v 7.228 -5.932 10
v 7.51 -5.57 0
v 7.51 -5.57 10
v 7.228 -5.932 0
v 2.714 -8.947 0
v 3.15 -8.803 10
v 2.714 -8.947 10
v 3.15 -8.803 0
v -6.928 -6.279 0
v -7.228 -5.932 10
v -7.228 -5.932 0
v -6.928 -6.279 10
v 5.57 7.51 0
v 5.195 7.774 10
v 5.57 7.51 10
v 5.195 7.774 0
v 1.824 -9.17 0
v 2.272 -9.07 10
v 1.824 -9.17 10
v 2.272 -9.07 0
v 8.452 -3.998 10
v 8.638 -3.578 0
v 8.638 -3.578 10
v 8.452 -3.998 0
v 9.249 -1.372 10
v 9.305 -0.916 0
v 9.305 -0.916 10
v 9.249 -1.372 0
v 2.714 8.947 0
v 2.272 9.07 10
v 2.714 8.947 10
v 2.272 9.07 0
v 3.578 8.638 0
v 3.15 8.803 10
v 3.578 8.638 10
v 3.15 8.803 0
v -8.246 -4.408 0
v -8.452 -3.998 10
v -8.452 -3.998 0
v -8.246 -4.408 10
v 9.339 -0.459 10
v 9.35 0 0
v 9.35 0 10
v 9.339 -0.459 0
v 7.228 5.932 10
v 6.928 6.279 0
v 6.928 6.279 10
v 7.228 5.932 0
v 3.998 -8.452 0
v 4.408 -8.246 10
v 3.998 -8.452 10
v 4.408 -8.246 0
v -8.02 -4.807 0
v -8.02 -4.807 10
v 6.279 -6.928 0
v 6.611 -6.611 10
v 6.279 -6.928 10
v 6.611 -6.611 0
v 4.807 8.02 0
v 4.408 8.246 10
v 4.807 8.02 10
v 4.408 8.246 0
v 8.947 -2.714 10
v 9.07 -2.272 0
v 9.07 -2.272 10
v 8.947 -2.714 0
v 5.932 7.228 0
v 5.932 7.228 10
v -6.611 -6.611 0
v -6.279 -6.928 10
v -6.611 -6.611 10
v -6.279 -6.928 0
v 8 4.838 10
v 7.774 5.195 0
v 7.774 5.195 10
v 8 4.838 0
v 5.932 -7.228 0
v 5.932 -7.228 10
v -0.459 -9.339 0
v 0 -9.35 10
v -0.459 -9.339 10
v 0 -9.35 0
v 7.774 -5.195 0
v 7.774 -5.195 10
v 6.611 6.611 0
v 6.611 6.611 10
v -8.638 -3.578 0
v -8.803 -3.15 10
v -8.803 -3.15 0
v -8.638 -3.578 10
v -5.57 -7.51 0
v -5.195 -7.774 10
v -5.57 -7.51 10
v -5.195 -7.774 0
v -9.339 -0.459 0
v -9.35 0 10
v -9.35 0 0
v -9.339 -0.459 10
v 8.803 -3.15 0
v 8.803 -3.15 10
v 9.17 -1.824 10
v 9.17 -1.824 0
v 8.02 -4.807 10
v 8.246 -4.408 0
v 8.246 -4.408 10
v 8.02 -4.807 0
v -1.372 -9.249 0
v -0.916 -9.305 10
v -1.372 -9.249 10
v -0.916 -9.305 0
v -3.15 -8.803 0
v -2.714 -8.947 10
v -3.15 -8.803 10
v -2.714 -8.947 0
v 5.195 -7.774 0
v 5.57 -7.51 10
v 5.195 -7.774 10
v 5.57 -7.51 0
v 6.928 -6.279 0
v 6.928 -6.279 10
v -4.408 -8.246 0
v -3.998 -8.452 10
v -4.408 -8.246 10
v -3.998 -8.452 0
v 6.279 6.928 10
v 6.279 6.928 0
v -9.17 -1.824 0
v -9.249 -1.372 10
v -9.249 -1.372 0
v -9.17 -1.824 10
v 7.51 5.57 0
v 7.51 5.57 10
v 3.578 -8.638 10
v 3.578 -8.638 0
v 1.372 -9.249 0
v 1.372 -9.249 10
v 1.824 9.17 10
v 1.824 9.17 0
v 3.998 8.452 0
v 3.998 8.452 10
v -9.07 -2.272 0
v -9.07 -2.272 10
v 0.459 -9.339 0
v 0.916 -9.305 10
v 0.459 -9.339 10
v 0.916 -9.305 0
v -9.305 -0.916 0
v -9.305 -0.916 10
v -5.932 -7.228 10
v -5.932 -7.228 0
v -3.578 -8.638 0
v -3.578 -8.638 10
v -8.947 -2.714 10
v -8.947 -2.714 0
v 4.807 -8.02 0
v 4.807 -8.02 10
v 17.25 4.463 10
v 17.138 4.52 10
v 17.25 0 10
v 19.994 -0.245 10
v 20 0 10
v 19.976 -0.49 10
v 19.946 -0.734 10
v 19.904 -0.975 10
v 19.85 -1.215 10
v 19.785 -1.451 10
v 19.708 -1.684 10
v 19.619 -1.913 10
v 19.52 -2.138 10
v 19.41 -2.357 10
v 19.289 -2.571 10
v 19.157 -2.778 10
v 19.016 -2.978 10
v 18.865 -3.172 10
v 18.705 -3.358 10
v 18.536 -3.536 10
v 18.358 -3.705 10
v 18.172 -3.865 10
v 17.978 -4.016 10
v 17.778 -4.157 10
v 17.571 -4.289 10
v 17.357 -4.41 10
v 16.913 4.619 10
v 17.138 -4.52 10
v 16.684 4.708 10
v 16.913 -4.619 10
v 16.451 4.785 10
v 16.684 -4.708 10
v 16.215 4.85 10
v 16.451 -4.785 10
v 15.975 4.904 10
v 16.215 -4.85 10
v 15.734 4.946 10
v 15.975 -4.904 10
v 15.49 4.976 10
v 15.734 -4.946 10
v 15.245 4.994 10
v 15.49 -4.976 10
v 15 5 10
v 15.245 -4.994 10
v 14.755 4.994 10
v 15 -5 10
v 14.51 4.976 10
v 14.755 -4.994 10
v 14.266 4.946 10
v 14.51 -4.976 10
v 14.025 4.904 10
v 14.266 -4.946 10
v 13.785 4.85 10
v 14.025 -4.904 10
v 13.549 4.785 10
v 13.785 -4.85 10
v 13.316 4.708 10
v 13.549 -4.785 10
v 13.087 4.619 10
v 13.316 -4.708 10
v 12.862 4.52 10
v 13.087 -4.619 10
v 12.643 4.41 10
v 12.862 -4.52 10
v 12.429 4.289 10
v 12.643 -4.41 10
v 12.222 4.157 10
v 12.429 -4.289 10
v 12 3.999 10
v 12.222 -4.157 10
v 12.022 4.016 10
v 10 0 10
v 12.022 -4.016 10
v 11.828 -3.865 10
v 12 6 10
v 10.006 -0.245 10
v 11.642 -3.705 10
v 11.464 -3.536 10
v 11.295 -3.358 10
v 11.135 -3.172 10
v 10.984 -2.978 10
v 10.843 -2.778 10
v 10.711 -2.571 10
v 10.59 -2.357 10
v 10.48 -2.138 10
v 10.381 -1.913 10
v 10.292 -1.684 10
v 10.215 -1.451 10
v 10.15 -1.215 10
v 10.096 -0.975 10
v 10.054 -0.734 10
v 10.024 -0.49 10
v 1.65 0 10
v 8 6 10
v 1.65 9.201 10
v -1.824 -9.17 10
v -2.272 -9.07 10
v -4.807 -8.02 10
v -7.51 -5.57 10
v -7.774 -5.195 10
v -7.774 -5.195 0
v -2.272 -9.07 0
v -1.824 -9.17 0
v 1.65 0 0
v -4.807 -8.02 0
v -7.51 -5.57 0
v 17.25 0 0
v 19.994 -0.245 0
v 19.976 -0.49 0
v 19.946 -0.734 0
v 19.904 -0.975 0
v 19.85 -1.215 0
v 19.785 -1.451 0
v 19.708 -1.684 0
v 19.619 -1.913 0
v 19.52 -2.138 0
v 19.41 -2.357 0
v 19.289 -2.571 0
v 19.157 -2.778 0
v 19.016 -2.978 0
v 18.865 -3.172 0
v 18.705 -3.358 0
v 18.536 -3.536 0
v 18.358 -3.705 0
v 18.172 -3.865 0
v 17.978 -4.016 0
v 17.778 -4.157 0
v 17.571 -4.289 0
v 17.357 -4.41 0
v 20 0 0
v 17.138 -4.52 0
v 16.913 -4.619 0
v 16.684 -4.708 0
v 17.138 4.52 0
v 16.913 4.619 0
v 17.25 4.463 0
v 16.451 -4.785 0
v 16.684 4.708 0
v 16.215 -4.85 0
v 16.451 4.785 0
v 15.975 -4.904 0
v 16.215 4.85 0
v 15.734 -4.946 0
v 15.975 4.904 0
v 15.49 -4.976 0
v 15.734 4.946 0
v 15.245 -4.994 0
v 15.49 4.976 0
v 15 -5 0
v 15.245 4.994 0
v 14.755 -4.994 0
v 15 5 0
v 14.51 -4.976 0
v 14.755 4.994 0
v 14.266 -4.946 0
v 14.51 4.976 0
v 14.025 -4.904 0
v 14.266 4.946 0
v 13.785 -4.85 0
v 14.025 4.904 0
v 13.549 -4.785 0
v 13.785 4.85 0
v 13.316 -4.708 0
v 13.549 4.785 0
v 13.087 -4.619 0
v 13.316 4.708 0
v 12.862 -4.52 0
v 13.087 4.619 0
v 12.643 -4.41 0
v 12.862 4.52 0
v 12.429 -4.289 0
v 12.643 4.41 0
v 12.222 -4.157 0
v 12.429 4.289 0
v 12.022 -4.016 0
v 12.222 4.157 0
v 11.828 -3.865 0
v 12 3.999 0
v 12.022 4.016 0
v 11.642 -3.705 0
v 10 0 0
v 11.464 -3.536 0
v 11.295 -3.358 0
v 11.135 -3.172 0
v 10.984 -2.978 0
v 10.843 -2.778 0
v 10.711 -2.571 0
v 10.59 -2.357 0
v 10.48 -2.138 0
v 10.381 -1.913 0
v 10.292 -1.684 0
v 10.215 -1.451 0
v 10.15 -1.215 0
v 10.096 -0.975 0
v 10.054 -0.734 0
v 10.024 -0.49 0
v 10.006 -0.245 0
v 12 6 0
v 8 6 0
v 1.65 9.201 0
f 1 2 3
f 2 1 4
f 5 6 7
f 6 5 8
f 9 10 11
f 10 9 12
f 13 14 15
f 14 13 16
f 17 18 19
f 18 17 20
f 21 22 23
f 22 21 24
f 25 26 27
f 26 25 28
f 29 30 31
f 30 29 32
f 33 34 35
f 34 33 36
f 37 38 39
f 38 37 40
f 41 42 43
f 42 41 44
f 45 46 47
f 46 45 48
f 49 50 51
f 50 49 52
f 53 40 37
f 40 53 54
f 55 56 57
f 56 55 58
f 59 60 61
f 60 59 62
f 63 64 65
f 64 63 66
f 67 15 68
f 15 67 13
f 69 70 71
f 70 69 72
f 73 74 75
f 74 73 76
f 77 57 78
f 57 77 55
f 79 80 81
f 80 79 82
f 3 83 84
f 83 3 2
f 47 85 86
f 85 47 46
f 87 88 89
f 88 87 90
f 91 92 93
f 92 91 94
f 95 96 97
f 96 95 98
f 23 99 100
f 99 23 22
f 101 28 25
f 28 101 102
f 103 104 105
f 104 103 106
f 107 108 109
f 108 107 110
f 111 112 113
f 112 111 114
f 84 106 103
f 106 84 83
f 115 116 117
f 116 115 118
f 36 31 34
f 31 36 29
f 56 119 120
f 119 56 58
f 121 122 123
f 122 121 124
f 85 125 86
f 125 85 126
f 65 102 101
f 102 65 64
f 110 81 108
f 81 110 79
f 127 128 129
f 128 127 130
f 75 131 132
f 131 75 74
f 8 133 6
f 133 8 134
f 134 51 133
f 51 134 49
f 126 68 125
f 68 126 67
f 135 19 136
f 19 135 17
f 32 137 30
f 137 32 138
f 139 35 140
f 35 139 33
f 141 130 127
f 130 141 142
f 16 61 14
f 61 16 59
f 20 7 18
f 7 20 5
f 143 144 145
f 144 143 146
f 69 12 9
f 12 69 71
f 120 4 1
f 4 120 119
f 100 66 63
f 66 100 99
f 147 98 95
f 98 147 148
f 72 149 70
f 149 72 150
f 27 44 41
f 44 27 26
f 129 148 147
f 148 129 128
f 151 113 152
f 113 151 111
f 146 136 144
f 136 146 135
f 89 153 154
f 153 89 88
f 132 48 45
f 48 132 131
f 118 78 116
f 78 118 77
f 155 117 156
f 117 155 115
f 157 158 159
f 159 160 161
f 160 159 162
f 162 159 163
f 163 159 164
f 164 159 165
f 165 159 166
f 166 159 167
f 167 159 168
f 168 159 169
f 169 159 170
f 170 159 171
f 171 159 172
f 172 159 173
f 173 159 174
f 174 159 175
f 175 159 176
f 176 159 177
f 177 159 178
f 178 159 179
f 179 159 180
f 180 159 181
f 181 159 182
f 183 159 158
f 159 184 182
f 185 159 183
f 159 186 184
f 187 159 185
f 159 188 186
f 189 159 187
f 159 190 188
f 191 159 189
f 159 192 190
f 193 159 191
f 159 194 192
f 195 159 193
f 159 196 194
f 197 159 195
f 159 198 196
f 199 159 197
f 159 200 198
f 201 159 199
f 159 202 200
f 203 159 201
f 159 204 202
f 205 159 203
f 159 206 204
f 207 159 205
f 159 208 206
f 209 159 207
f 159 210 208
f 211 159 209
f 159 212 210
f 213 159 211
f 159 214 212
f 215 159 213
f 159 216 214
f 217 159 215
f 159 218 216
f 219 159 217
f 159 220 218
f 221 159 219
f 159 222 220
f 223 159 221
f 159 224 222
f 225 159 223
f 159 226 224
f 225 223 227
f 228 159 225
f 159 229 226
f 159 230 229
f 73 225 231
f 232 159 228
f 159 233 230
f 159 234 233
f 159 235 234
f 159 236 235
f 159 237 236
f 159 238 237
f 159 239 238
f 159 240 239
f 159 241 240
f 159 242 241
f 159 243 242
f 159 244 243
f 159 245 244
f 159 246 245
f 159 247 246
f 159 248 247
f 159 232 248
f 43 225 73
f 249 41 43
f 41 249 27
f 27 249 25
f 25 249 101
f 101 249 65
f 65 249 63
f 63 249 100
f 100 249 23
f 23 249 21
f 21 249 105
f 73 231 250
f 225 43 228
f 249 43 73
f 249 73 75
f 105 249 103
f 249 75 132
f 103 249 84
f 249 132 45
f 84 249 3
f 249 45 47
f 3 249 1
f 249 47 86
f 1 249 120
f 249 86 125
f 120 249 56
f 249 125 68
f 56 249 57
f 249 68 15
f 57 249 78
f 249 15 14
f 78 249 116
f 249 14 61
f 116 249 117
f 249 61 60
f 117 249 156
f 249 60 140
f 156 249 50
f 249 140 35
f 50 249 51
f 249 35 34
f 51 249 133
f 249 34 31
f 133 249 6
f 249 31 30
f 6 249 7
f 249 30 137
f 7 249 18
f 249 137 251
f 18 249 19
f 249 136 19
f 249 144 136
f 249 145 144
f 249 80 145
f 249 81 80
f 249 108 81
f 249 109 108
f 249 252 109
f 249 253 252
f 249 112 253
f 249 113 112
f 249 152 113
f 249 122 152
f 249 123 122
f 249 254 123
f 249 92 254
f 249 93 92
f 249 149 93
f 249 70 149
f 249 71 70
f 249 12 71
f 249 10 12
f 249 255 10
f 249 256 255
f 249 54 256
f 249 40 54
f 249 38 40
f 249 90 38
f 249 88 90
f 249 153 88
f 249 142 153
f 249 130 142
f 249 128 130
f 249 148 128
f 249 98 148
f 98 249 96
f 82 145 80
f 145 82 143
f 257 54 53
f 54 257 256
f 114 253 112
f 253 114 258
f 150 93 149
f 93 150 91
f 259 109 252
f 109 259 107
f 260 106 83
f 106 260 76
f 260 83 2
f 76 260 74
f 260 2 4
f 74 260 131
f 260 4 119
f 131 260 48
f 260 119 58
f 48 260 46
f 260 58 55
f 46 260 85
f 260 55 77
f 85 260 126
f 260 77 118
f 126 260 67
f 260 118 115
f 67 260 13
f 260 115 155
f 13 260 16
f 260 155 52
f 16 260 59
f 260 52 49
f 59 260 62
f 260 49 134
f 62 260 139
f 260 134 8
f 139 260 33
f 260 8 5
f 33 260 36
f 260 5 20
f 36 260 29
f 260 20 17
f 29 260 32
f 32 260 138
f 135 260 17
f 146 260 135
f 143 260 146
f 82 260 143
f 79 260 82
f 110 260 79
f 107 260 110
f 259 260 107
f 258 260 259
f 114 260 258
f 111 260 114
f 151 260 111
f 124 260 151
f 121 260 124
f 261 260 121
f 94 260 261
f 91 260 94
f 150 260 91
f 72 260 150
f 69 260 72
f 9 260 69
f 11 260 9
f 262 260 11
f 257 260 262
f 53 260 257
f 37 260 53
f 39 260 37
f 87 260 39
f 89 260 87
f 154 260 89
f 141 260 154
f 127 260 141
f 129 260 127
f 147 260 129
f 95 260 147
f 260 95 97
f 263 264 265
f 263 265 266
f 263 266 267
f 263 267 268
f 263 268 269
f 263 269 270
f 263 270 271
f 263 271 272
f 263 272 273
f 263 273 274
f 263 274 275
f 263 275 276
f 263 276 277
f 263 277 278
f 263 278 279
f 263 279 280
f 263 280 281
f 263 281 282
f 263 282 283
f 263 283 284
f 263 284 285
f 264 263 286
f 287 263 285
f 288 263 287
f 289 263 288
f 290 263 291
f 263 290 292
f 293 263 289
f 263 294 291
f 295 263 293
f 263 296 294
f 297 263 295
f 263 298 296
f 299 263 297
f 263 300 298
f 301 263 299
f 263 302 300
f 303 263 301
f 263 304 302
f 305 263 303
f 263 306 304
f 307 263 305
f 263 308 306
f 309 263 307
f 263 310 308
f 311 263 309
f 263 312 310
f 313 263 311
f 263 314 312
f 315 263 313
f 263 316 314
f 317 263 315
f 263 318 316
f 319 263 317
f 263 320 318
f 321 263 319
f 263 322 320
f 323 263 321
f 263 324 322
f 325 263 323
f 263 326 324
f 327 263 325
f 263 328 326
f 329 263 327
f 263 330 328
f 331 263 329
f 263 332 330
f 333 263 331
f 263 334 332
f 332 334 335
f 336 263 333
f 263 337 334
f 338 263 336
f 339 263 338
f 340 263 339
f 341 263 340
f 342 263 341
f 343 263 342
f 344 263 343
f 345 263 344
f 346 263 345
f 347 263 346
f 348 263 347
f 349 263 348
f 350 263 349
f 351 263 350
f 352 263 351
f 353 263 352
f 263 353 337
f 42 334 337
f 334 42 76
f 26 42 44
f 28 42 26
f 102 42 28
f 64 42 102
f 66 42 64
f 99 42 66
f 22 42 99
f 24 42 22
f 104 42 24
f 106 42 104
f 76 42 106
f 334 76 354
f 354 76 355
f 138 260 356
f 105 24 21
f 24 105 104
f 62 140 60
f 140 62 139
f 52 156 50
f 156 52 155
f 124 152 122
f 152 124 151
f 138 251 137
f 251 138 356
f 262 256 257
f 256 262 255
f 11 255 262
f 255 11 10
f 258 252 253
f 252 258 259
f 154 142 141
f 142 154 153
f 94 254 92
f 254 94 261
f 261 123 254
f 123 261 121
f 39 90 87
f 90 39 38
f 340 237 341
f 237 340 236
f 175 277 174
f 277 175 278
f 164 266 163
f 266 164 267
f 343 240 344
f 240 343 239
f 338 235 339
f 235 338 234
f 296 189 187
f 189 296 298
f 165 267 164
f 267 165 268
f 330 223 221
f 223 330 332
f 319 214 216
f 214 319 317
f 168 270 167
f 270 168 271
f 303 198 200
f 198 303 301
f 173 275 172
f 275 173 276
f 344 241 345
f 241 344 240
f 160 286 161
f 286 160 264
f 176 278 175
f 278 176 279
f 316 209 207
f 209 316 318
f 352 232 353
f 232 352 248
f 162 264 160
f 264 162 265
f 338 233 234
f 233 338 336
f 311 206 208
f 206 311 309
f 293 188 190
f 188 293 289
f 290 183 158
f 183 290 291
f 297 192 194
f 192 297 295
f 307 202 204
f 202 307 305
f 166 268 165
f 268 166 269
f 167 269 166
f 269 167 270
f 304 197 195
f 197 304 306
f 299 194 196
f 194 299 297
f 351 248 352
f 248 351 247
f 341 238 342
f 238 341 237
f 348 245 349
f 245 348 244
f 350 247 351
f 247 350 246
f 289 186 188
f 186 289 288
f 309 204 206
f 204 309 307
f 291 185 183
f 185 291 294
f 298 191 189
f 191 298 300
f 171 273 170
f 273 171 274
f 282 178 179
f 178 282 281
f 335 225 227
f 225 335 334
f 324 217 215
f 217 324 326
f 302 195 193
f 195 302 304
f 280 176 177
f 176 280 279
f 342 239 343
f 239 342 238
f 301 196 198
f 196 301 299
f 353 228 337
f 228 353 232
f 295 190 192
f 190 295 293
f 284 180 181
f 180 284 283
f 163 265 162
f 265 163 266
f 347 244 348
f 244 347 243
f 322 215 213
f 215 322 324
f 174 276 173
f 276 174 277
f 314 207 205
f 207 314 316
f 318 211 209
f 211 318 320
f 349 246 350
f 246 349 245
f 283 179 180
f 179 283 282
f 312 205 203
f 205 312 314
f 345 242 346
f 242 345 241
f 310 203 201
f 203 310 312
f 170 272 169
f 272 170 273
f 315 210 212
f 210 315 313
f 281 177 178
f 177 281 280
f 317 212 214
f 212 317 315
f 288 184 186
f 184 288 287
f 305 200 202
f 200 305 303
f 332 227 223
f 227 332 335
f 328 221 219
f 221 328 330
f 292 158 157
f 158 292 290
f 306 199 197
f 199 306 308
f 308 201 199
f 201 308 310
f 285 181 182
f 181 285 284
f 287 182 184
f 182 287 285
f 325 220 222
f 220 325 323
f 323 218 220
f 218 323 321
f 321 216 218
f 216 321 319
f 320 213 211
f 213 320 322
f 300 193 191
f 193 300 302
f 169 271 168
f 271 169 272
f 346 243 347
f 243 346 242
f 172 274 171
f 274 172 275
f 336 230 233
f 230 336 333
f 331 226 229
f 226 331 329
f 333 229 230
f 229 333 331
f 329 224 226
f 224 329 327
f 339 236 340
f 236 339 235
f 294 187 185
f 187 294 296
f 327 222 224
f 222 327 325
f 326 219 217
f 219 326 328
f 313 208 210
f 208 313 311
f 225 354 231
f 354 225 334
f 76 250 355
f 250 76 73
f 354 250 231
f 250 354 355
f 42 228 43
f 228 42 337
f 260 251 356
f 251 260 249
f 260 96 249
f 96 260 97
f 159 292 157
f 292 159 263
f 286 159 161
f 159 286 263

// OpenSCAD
$fn = 128; // High resolution for smooth curves and accurate hole sizes

// --- Dimensions ---
// Rod dimensions
$rod_diameter = 12.7;
$rod_radius = $rod_diameter / 2;
$rod_wall_thickness = 3;
$rod_outer_diameter = $rod_diameter + (2 * $rod_wall_thickness);
$rod_outer_radius = $rod_outer_diameter / 2;

// Tubing dimensions
$tubing_diameter = 6;
$tubing_radius = $tubing_diameter / 2;
$tubing_wall_thickness = 2;
$tubing_outer_diameter = $tubing_diameter + (2 * $tubing_wall_thickness);
$tubing_outer_radius = $tubing_outer_diameter / 2;

// Positioning
$bridge_start_x = 8;
$bridge_end_x = 12;
$bridge_width_y = 6;

// Cutout dimensions
$rod_cutout_width = 10;
$rod_cutout_half_y = 5;

$tubing_cutout_width = 4.5;
$tubing_cutout_half_y = 2.25;

// Extrusion height
$height = 10;

// --- Main Module ---
module snap_on_clip() {
    difference() {
        // 1. Create the solid base profile (Union of all parts)
        union() {
            // Rod Ring
            // Outer cylinder
            cylinder(h = $height, r = $rod_outer_radius, center = [0, 0, $height/2]);
            
            // Tubing Ring (Positioned at x=15, y=0)
            translate([15, 0, 0]) {
                cylinder(h = $height, r = $tubing_outer_radius, center = [0, 0, $height/2]);
            }
            
            // Solid Bridge (Positioned between x=8 and x=12)
            // Width is 6mm in Y, centered at y=0 -> y from -3 to 3
            translate([$bridge_start_x, 0, 0]) {
                cube([($bridge_end_x - $bridge_start_x), $bridge_width_y, $height], center = [0, 0, $height/2]);
            }
        }
        
        // 2. Cut out the Rod Opening (-X side)
        // Condition: x < 0 and -5 < y < 5
        // We extend slightly past the faces to ensure clean cut
        // The cutout is 10mm wide (from x=-5 to x=0). 
        // We need to cut from x = -5 - buffer to x = 0 + buffer.
        // Center of this cutout box is at x = -2.5.
        translate([-($rod_radius + 0.5), 0, 0]) {
            // Cut a box that covers the opening area
            // Width: 10mm (from x=-5 to x=0) + buffer
            // Height: 10mm (from y=-5 to y=5) + buffer
            // Depth: Full height + buffer
            // Center calculation: 
            // x_center = -5 + (10/2) = 0? No.
            // Range is [-5, 0]. Center is -2.5.
            // Let's use explicit translation for clarity.
            translate([-2.5, 0, 0]) {
                cube([($rod_cutout_width + 1), ($rod_cutout_half_y * 2 + 1), $height + 1], 
                      center = [0, 0, $height/2]);
            }
        }
        
        // 3. Cut out the Tubing Opening (+X side)
        // Condition: x > 15 and -2.25 < y < 2.25
        // The cutout is 4.5mm wide (from x=15 to x=19.5).
        // Center of this cutout box is at x = 15 + (4.5/2) = 17.25.
        translate([17.25, 0, 0]) {
            // Cut a box that covers the opening area
            // Width: 4.5mm (from x=15 to x=19.5) + buffer
            // Height: 4.5mm (from y=-2.25 to y=2.25) + buffer
            // Depth: Full height + buffer
            cube([$tubing_cutout_width + 1, ($tubing_cutout_half_y * 2) + 1, $height + 1], 
                  center = [0, 0, $height/2]);
        }
    }
}

// Generate the part
snap_on_clip();
